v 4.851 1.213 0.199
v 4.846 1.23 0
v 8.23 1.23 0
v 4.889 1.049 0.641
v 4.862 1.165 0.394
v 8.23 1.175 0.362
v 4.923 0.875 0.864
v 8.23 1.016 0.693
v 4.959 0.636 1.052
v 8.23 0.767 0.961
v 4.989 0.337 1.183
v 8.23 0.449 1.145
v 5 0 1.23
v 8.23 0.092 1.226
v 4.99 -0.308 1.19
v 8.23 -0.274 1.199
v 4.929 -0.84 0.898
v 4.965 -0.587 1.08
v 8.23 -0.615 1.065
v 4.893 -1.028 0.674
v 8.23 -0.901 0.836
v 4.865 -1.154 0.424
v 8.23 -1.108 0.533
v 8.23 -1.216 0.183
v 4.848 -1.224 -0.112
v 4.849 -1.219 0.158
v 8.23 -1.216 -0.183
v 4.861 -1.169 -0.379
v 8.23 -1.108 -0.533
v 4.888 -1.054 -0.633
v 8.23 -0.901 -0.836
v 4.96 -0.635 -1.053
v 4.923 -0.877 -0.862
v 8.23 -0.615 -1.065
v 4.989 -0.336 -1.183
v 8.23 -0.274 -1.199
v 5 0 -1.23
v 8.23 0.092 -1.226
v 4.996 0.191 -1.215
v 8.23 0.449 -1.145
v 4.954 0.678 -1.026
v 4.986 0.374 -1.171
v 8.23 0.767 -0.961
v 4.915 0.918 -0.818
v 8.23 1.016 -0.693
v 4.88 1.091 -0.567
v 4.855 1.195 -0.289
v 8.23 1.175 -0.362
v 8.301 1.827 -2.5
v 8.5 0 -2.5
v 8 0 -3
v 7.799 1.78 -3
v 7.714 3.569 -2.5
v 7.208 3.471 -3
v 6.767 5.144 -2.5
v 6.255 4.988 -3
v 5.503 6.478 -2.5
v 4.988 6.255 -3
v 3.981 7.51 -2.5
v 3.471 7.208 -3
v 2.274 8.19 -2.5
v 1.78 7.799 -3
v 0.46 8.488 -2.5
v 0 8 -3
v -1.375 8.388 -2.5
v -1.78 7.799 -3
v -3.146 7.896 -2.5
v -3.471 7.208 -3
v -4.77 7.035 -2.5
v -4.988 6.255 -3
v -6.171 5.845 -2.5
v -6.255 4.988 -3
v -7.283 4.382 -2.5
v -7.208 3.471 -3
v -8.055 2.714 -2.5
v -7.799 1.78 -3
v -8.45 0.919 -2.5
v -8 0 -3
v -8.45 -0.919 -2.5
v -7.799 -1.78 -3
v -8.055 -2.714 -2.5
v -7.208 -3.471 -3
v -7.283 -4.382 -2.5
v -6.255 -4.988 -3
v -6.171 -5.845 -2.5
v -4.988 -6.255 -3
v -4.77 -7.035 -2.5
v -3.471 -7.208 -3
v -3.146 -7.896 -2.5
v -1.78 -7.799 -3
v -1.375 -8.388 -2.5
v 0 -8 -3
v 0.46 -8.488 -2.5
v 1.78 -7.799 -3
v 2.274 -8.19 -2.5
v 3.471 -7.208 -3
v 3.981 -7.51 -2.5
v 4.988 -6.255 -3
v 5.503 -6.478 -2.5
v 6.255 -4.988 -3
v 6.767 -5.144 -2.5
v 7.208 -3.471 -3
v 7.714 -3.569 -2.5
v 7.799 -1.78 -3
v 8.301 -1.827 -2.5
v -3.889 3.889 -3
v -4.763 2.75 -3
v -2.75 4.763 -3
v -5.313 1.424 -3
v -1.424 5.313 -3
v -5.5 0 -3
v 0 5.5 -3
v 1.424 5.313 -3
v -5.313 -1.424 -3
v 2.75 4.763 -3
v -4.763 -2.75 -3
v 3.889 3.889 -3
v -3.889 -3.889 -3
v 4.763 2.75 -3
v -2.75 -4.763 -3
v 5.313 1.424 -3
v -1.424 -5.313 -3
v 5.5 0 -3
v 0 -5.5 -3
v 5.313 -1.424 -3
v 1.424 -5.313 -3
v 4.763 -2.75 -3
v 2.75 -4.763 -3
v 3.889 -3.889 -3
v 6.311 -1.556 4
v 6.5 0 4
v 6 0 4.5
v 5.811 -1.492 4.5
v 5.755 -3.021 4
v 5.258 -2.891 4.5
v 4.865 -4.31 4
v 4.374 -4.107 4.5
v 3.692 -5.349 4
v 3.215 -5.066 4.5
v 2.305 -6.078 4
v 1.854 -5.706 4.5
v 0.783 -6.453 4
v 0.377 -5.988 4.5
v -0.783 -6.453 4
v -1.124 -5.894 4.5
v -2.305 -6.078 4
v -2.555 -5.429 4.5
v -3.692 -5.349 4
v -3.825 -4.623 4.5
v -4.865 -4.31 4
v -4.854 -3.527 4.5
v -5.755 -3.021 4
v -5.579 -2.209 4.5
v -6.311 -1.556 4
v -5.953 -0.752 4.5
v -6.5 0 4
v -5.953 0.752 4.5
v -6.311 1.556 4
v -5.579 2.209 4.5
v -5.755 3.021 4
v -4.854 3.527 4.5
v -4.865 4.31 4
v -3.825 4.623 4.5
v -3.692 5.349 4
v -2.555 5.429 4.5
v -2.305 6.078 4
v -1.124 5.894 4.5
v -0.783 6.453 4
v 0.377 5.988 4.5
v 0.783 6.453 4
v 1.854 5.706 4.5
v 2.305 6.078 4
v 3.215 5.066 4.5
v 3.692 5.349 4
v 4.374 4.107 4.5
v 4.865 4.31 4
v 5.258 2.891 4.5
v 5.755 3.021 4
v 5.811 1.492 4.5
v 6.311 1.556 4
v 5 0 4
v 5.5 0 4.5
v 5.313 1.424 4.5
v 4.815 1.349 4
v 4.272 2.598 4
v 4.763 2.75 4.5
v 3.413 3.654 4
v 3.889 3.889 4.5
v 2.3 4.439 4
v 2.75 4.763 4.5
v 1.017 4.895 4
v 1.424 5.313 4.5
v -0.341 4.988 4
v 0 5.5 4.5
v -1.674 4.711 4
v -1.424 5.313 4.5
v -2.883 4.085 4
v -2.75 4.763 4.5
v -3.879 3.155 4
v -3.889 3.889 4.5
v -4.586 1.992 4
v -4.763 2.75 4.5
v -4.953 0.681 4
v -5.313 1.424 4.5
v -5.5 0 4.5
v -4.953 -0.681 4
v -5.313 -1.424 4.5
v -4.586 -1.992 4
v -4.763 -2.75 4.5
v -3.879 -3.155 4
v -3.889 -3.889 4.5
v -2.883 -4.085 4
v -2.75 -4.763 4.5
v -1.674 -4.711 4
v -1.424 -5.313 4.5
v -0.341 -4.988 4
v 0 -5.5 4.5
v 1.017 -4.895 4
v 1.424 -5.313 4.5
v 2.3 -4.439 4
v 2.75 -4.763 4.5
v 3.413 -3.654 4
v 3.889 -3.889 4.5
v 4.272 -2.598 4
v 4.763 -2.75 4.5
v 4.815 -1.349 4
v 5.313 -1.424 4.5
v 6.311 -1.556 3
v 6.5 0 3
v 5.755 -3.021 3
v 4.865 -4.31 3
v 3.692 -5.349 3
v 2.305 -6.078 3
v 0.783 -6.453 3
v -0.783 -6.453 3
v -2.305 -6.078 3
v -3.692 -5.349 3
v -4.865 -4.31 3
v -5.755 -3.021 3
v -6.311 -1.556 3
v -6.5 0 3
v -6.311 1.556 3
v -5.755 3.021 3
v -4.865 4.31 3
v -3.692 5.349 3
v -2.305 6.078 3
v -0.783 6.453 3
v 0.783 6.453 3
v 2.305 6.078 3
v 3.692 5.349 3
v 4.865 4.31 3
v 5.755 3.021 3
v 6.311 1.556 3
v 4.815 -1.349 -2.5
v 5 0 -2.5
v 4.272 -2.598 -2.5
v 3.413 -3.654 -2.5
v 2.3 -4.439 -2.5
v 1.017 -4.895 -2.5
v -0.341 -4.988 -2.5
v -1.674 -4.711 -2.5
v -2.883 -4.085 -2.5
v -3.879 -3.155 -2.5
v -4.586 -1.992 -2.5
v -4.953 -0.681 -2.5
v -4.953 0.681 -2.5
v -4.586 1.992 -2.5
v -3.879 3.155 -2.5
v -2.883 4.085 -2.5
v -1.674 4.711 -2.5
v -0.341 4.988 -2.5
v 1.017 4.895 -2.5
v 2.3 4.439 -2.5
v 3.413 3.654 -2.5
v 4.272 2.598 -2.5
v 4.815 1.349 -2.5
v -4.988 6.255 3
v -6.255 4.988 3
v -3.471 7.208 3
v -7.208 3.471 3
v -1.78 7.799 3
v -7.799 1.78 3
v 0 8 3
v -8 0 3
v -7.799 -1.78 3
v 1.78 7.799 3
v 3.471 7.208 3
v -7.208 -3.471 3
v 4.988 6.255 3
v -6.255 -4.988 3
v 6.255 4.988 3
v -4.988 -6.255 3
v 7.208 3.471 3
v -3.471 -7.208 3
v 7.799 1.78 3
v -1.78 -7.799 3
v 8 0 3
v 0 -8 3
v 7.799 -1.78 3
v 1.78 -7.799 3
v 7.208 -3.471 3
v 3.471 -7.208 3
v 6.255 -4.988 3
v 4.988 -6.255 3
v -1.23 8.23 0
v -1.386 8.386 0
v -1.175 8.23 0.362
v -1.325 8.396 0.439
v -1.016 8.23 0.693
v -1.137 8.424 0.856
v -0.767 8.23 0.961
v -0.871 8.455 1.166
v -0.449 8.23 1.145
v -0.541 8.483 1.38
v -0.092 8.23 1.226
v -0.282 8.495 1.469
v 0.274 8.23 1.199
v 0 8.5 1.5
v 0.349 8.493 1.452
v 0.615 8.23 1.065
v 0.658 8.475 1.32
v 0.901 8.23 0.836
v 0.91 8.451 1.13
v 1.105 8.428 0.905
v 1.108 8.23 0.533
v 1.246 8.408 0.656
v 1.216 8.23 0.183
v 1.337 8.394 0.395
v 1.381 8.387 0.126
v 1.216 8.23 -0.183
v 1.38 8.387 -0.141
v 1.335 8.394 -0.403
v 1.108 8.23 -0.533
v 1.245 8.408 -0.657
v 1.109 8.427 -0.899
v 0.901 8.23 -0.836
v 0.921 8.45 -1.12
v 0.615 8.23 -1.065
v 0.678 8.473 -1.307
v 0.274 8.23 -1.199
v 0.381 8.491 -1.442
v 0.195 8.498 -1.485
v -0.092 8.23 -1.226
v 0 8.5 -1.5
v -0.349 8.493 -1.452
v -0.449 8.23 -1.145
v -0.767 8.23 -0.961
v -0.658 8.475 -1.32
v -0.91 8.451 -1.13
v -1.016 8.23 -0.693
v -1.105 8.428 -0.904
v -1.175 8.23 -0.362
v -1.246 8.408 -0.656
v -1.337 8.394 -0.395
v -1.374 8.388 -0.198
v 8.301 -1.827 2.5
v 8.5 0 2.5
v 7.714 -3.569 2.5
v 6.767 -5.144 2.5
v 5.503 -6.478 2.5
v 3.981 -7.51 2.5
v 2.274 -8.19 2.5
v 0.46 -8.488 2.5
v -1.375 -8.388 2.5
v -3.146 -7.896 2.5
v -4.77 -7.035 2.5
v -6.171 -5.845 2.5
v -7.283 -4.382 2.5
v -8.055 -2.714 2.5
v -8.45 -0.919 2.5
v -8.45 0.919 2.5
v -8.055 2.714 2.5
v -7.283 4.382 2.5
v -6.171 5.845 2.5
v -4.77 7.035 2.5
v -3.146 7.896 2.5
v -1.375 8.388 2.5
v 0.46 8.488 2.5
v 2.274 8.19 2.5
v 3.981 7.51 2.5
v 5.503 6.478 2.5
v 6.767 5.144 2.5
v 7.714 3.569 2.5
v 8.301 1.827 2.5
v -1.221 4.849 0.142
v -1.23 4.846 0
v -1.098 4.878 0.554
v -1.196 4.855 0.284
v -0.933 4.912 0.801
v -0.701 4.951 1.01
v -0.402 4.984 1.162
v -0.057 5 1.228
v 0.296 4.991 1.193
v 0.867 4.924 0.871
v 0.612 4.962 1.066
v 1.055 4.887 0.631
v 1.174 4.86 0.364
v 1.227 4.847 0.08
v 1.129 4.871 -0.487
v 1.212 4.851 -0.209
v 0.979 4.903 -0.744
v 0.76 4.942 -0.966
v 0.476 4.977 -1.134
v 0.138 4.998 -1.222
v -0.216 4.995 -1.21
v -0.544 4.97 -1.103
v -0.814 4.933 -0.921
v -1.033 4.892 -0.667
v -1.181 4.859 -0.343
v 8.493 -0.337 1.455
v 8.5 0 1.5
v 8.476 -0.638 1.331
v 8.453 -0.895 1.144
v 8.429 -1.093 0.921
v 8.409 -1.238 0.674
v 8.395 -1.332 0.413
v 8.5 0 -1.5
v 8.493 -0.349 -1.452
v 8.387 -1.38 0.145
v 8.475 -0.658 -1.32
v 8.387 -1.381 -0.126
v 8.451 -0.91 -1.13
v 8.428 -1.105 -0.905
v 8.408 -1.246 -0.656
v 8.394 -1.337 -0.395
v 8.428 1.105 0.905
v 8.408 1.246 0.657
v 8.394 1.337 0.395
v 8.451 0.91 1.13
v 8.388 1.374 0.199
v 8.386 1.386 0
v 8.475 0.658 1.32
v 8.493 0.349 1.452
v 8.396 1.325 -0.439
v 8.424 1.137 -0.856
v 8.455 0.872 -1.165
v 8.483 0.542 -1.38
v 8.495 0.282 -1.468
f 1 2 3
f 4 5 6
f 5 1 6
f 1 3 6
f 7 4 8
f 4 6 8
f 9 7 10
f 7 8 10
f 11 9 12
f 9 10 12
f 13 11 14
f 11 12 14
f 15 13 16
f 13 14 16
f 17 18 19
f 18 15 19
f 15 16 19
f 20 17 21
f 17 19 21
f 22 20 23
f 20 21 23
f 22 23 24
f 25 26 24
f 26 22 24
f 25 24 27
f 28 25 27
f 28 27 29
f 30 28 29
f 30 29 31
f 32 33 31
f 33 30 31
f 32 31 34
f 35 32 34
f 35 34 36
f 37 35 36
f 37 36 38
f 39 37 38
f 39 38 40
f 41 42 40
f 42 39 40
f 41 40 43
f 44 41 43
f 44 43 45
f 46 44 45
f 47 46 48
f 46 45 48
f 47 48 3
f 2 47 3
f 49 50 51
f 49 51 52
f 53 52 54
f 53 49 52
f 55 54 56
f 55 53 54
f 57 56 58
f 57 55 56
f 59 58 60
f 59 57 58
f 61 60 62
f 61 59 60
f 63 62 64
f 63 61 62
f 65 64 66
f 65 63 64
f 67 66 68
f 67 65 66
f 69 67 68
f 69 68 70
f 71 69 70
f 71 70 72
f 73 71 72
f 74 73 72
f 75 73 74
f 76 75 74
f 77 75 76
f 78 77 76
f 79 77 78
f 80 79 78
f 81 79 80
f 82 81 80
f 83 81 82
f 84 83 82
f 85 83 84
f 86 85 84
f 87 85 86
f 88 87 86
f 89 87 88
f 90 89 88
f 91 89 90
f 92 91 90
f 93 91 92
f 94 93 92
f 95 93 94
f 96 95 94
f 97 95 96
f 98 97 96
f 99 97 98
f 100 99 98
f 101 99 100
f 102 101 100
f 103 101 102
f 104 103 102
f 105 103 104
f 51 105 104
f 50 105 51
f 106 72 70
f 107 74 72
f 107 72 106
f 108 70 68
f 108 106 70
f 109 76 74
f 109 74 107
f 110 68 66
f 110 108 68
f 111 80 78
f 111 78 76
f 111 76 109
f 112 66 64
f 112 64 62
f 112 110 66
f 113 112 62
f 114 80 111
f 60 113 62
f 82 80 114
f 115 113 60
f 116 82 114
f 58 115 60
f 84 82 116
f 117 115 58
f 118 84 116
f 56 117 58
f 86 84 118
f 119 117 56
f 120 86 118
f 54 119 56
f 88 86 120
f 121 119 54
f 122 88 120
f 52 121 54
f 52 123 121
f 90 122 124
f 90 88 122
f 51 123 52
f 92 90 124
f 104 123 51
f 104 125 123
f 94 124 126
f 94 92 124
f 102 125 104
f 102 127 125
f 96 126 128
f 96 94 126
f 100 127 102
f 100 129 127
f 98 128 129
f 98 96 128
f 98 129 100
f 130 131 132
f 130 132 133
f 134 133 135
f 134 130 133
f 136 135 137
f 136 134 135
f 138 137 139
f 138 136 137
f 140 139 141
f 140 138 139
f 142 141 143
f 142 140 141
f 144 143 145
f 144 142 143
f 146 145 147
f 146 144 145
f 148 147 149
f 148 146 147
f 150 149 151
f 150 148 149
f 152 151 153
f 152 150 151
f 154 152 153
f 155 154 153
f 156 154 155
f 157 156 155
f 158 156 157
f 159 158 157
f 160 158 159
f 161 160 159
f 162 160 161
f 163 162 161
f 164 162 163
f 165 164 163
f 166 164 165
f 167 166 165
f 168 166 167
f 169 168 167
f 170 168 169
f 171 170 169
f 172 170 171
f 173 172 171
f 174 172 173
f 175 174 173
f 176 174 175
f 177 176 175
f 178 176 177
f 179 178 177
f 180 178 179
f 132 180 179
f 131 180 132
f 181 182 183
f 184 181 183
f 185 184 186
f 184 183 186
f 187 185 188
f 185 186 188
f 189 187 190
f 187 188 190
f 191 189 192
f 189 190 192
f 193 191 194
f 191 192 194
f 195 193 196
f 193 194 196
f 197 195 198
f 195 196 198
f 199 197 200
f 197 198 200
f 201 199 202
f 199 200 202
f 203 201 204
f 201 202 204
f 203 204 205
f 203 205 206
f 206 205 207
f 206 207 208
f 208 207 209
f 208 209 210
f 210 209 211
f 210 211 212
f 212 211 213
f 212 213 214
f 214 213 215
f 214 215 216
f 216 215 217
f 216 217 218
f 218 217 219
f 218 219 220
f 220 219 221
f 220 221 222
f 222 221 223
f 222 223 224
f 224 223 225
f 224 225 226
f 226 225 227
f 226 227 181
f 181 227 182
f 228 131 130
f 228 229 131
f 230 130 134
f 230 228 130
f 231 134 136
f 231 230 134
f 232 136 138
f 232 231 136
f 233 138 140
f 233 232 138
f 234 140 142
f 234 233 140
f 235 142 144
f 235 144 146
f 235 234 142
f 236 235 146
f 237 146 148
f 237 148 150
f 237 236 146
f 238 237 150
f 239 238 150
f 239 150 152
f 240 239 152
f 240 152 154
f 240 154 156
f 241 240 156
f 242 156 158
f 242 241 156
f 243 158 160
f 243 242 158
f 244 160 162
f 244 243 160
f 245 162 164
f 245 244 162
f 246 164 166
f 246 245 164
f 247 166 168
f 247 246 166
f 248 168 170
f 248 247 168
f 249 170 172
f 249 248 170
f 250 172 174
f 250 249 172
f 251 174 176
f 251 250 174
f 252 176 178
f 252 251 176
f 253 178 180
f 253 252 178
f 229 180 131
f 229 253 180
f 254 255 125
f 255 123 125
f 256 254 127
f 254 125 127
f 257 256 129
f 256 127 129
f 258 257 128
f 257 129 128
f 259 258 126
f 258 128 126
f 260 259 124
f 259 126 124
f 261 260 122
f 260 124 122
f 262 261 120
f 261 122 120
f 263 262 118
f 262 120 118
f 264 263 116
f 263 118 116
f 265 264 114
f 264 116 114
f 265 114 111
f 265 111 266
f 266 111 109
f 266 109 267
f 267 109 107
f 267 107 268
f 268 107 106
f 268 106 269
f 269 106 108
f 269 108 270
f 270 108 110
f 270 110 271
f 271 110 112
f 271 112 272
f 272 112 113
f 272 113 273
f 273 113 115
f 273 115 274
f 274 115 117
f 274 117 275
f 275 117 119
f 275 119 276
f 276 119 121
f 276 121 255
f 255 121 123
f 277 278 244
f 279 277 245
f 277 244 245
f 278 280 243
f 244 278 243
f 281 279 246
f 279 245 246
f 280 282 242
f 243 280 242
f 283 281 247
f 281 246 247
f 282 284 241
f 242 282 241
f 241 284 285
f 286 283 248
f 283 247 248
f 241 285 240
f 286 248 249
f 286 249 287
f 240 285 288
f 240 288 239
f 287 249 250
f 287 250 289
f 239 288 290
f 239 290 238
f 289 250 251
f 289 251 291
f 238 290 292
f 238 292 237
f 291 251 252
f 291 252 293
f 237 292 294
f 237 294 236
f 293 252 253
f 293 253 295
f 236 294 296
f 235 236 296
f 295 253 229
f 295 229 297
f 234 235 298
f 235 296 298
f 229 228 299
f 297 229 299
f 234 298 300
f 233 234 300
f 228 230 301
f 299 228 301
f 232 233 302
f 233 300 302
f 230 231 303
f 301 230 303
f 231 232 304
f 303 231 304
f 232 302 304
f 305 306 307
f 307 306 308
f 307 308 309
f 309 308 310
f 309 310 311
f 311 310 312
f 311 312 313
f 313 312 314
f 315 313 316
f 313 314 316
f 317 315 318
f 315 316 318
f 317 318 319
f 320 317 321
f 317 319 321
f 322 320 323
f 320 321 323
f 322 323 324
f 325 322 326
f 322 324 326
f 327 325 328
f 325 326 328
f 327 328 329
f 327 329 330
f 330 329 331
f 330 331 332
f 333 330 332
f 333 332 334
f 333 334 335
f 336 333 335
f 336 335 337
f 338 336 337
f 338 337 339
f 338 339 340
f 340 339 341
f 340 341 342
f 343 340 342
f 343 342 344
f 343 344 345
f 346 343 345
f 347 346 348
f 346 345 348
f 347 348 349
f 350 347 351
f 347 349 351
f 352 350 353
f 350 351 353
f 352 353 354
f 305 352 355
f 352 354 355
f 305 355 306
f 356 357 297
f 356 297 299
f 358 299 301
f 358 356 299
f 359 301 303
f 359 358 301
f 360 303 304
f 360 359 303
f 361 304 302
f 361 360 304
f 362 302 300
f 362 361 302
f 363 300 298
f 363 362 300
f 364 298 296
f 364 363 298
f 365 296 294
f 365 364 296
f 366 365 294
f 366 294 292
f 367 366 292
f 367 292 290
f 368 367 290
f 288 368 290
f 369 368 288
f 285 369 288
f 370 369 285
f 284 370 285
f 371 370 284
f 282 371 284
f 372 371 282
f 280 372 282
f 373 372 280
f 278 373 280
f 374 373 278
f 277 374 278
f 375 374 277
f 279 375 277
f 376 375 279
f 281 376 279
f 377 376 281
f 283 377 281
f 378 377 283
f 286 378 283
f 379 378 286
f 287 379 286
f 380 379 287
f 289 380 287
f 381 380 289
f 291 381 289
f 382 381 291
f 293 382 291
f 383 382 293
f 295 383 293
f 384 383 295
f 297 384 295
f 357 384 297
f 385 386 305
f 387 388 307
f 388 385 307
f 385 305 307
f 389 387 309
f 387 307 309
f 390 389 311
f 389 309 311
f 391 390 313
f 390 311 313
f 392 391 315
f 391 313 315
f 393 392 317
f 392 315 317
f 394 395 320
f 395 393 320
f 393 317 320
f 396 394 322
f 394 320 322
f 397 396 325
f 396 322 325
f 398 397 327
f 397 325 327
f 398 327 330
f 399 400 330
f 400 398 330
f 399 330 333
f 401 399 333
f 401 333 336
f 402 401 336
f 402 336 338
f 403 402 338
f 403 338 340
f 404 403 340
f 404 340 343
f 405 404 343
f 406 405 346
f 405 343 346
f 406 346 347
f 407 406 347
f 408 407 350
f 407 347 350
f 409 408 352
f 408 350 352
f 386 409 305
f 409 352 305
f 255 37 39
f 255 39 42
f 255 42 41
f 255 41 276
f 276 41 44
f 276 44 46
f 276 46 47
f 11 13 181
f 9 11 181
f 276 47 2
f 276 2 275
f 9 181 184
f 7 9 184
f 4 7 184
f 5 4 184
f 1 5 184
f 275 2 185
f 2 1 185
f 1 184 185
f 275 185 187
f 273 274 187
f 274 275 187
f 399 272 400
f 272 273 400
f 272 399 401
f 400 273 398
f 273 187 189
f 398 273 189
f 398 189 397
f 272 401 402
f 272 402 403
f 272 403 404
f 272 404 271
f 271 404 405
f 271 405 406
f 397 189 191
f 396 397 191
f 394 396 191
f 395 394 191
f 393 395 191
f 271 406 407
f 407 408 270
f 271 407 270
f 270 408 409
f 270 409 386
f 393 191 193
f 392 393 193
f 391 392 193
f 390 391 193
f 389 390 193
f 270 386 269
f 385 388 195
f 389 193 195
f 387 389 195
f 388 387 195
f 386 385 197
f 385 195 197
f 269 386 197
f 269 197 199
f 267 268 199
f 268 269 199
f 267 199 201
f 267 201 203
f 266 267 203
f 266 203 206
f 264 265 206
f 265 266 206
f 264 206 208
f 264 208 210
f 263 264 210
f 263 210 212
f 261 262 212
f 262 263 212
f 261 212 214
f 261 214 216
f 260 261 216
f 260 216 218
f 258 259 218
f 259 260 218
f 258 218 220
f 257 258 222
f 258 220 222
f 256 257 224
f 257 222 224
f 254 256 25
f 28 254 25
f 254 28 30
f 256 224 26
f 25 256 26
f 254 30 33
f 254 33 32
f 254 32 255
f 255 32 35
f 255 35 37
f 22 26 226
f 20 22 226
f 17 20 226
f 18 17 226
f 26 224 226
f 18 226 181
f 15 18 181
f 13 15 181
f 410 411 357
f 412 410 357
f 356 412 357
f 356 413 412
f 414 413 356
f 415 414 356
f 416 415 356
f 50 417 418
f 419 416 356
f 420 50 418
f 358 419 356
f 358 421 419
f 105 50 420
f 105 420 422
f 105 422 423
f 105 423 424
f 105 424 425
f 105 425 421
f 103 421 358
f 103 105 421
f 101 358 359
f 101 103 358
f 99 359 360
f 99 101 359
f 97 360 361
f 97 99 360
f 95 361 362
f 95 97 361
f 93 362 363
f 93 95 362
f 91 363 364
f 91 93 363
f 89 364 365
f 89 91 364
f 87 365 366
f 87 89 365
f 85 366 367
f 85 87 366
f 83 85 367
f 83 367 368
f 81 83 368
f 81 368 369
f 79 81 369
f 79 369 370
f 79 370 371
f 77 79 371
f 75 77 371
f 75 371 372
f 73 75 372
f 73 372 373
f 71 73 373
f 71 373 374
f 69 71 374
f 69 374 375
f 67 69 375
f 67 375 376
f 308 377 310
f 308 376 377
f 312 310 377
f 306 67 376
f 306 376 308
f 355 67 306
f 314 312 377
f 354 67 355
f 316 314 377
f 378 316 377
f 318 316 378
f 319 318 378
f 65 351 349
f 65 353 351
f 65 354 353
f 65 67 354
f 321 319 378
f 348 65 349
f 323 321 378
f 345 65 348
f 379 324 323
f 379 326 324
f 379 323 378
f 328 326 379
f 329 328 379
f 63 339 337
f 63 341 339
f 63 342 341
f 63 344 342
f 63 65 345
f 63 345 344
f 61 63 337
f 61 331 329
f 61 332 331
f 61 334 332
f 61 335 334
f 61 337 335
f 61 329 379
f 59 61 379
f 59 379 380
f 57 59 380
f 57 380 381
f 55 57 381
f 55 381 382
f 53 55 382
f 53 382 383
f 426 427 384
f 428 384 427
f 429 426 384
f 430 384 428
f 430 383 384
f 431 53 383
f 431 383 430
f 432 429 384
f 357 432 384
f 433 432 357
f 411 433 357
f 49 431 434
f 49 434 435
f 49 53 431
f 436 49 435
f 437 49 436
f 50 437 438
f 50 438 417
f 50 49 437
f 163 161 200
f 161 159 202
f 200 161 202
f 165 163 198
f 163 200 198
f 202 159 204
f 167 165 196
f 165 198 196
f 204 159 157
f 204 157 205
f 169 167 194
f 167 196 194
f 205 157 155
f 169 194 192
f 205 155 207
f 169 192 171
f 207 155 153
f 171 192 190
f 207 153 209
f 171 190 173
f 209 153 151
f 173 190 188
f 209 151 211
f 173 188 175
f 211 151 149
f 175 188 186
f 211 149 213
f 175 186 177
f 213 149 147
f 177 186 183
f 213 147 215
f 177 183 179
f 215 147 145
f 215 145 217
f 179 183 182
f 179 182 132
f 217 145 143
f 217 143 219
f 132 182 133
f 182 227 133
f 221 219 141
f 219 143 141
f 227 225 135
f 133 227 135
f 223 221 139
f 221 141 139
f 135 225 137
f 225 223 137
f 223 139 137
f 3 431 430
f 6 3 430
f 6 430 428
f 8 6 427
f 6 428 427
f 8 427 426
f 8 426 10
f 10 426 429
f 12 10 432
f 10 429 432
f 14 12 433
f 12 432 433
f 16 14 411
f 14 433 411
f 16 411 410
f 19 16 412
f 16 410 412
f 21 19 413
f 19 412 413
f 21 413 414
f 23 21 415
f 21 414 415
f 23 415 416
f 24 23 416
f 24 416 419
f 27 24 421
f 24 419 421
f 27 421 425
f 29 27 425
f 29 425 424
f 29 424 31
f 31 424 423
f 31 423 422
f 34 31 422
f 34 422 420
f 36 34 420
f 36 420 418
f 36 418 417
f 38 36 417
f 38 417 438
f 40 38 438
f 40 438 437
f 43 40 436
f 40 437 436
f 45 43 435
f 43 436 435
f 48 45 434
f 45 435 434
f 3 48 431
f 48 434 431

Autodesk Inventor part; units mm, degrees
sketch "Sketch_1" plane through (0, 0, 0) normal (0, 1, 0) x (-1, 0, 0)
  line L0 (0, 4.5) -> (0, -3)
  line L1 (-5, 4) -> (-5.5, 4.5)
  line L2 (-5.5, 4.5) -> (-6, 4.5)
  line L3 (-6, 4.5) -> (-6.5, 4)
  line L4 (-6.5, 4) -> (-6.5, 3)
  line L5 (-6.5, 3) -> (-8, 3)
  line L6 (-8, 3) -> (-8.5, 2.5)
  line L7 (-8.5, 2.5) -> (-8.5, -2.5)
  line L8 (-8.5, -2.5) -> (-8, -3)
  line L9 (-8, -3) -> (-5.5, -3)
  line L10 (-5.5, -3) -> (-5, -2.5)
  line L11 (-5, -2.5) -> (-5, 4)
revolve "Revolution1" add sketch "Sketch_1" angle 360 about axis through (0, 0, 4.5) along (0, 0, -1)
sketch "Sketch_8" plane through (0, 0, 0) normal (0, 0, 1) x (1, 0, 0)
  line L0 (8.5, 0) -> (4, 0)
  line L1 (4, 0) -> (4, 1.2295)
  line L2 (4, 1.2295) -> (8.2295, 1.2295)
  line L3 (8.2295, 1.2295) -> (8.5, 1.5)
  line L4 (8.5, 1.5) -> (8.5, 0)
  line L5 (8.5, 0) -> (4, 0)
revolve "Revolution2" cut sketch "Sketch_8" angle 360 about axis through (8.5, 0, 0) along (-1, 0, 0)
thread "Thread1" size "M3x0.5" class "6H" standard "ISO Metric profile" full length
sketch "Sketch_2" plane through (0, 0, 0) normal (0, 0, 1) x (1, 0, 0)
  line L0 (0, 8.5) -> (0, 4)
  line L1 (0, 4) -> (-1.2295, 4)
  line L2 (-1.2295, 4) -> (-1.2295, 8.2295)
  line L3 (-1.2295, 8.2295) -> (-1.5, 8.5)
  line L4 (-1.5, 8.5) -> (0, 8.5)
  line L5 (0, 8.5) -> (0, 4)
revolve "Revolution3" cut sketch "Sketch_2" angle 360 about axis through (0, 8.5, 0) along (0, -1, 0)
thread "Thread2" size "M3x0.5" class "6H" standard "ISO Metric profile" full length
ref_plane "body_set_h_XY" through (0, 8.5, 0) normal (0, 1, 0) x (1, 0, 0)
ref_plane "body_set_h_YZ" through (0, 8.5, 0) normal (1, 0, 0) x (0, 0, -1)
ref_plane "body_set_h_ZX" through (0, 8.5, 0) normal (0, 0, -1) x (0, 1, 0)
ref_plane "body_set_v_XY" through (8.5, 0, 0) normal (1, 0, 0) x (0, 0, -1)
ref_plane "body_set_v_YZ" through (8.5, 0, 0) normal (0, 0, -1) x (0, 1, 0)
ref_plane "body_set_v_ZX" through (8.5, 0, 0) normal (0, 1, 0) x (1, 0, 0)
properties part number "SCBRJ10-13_b"
